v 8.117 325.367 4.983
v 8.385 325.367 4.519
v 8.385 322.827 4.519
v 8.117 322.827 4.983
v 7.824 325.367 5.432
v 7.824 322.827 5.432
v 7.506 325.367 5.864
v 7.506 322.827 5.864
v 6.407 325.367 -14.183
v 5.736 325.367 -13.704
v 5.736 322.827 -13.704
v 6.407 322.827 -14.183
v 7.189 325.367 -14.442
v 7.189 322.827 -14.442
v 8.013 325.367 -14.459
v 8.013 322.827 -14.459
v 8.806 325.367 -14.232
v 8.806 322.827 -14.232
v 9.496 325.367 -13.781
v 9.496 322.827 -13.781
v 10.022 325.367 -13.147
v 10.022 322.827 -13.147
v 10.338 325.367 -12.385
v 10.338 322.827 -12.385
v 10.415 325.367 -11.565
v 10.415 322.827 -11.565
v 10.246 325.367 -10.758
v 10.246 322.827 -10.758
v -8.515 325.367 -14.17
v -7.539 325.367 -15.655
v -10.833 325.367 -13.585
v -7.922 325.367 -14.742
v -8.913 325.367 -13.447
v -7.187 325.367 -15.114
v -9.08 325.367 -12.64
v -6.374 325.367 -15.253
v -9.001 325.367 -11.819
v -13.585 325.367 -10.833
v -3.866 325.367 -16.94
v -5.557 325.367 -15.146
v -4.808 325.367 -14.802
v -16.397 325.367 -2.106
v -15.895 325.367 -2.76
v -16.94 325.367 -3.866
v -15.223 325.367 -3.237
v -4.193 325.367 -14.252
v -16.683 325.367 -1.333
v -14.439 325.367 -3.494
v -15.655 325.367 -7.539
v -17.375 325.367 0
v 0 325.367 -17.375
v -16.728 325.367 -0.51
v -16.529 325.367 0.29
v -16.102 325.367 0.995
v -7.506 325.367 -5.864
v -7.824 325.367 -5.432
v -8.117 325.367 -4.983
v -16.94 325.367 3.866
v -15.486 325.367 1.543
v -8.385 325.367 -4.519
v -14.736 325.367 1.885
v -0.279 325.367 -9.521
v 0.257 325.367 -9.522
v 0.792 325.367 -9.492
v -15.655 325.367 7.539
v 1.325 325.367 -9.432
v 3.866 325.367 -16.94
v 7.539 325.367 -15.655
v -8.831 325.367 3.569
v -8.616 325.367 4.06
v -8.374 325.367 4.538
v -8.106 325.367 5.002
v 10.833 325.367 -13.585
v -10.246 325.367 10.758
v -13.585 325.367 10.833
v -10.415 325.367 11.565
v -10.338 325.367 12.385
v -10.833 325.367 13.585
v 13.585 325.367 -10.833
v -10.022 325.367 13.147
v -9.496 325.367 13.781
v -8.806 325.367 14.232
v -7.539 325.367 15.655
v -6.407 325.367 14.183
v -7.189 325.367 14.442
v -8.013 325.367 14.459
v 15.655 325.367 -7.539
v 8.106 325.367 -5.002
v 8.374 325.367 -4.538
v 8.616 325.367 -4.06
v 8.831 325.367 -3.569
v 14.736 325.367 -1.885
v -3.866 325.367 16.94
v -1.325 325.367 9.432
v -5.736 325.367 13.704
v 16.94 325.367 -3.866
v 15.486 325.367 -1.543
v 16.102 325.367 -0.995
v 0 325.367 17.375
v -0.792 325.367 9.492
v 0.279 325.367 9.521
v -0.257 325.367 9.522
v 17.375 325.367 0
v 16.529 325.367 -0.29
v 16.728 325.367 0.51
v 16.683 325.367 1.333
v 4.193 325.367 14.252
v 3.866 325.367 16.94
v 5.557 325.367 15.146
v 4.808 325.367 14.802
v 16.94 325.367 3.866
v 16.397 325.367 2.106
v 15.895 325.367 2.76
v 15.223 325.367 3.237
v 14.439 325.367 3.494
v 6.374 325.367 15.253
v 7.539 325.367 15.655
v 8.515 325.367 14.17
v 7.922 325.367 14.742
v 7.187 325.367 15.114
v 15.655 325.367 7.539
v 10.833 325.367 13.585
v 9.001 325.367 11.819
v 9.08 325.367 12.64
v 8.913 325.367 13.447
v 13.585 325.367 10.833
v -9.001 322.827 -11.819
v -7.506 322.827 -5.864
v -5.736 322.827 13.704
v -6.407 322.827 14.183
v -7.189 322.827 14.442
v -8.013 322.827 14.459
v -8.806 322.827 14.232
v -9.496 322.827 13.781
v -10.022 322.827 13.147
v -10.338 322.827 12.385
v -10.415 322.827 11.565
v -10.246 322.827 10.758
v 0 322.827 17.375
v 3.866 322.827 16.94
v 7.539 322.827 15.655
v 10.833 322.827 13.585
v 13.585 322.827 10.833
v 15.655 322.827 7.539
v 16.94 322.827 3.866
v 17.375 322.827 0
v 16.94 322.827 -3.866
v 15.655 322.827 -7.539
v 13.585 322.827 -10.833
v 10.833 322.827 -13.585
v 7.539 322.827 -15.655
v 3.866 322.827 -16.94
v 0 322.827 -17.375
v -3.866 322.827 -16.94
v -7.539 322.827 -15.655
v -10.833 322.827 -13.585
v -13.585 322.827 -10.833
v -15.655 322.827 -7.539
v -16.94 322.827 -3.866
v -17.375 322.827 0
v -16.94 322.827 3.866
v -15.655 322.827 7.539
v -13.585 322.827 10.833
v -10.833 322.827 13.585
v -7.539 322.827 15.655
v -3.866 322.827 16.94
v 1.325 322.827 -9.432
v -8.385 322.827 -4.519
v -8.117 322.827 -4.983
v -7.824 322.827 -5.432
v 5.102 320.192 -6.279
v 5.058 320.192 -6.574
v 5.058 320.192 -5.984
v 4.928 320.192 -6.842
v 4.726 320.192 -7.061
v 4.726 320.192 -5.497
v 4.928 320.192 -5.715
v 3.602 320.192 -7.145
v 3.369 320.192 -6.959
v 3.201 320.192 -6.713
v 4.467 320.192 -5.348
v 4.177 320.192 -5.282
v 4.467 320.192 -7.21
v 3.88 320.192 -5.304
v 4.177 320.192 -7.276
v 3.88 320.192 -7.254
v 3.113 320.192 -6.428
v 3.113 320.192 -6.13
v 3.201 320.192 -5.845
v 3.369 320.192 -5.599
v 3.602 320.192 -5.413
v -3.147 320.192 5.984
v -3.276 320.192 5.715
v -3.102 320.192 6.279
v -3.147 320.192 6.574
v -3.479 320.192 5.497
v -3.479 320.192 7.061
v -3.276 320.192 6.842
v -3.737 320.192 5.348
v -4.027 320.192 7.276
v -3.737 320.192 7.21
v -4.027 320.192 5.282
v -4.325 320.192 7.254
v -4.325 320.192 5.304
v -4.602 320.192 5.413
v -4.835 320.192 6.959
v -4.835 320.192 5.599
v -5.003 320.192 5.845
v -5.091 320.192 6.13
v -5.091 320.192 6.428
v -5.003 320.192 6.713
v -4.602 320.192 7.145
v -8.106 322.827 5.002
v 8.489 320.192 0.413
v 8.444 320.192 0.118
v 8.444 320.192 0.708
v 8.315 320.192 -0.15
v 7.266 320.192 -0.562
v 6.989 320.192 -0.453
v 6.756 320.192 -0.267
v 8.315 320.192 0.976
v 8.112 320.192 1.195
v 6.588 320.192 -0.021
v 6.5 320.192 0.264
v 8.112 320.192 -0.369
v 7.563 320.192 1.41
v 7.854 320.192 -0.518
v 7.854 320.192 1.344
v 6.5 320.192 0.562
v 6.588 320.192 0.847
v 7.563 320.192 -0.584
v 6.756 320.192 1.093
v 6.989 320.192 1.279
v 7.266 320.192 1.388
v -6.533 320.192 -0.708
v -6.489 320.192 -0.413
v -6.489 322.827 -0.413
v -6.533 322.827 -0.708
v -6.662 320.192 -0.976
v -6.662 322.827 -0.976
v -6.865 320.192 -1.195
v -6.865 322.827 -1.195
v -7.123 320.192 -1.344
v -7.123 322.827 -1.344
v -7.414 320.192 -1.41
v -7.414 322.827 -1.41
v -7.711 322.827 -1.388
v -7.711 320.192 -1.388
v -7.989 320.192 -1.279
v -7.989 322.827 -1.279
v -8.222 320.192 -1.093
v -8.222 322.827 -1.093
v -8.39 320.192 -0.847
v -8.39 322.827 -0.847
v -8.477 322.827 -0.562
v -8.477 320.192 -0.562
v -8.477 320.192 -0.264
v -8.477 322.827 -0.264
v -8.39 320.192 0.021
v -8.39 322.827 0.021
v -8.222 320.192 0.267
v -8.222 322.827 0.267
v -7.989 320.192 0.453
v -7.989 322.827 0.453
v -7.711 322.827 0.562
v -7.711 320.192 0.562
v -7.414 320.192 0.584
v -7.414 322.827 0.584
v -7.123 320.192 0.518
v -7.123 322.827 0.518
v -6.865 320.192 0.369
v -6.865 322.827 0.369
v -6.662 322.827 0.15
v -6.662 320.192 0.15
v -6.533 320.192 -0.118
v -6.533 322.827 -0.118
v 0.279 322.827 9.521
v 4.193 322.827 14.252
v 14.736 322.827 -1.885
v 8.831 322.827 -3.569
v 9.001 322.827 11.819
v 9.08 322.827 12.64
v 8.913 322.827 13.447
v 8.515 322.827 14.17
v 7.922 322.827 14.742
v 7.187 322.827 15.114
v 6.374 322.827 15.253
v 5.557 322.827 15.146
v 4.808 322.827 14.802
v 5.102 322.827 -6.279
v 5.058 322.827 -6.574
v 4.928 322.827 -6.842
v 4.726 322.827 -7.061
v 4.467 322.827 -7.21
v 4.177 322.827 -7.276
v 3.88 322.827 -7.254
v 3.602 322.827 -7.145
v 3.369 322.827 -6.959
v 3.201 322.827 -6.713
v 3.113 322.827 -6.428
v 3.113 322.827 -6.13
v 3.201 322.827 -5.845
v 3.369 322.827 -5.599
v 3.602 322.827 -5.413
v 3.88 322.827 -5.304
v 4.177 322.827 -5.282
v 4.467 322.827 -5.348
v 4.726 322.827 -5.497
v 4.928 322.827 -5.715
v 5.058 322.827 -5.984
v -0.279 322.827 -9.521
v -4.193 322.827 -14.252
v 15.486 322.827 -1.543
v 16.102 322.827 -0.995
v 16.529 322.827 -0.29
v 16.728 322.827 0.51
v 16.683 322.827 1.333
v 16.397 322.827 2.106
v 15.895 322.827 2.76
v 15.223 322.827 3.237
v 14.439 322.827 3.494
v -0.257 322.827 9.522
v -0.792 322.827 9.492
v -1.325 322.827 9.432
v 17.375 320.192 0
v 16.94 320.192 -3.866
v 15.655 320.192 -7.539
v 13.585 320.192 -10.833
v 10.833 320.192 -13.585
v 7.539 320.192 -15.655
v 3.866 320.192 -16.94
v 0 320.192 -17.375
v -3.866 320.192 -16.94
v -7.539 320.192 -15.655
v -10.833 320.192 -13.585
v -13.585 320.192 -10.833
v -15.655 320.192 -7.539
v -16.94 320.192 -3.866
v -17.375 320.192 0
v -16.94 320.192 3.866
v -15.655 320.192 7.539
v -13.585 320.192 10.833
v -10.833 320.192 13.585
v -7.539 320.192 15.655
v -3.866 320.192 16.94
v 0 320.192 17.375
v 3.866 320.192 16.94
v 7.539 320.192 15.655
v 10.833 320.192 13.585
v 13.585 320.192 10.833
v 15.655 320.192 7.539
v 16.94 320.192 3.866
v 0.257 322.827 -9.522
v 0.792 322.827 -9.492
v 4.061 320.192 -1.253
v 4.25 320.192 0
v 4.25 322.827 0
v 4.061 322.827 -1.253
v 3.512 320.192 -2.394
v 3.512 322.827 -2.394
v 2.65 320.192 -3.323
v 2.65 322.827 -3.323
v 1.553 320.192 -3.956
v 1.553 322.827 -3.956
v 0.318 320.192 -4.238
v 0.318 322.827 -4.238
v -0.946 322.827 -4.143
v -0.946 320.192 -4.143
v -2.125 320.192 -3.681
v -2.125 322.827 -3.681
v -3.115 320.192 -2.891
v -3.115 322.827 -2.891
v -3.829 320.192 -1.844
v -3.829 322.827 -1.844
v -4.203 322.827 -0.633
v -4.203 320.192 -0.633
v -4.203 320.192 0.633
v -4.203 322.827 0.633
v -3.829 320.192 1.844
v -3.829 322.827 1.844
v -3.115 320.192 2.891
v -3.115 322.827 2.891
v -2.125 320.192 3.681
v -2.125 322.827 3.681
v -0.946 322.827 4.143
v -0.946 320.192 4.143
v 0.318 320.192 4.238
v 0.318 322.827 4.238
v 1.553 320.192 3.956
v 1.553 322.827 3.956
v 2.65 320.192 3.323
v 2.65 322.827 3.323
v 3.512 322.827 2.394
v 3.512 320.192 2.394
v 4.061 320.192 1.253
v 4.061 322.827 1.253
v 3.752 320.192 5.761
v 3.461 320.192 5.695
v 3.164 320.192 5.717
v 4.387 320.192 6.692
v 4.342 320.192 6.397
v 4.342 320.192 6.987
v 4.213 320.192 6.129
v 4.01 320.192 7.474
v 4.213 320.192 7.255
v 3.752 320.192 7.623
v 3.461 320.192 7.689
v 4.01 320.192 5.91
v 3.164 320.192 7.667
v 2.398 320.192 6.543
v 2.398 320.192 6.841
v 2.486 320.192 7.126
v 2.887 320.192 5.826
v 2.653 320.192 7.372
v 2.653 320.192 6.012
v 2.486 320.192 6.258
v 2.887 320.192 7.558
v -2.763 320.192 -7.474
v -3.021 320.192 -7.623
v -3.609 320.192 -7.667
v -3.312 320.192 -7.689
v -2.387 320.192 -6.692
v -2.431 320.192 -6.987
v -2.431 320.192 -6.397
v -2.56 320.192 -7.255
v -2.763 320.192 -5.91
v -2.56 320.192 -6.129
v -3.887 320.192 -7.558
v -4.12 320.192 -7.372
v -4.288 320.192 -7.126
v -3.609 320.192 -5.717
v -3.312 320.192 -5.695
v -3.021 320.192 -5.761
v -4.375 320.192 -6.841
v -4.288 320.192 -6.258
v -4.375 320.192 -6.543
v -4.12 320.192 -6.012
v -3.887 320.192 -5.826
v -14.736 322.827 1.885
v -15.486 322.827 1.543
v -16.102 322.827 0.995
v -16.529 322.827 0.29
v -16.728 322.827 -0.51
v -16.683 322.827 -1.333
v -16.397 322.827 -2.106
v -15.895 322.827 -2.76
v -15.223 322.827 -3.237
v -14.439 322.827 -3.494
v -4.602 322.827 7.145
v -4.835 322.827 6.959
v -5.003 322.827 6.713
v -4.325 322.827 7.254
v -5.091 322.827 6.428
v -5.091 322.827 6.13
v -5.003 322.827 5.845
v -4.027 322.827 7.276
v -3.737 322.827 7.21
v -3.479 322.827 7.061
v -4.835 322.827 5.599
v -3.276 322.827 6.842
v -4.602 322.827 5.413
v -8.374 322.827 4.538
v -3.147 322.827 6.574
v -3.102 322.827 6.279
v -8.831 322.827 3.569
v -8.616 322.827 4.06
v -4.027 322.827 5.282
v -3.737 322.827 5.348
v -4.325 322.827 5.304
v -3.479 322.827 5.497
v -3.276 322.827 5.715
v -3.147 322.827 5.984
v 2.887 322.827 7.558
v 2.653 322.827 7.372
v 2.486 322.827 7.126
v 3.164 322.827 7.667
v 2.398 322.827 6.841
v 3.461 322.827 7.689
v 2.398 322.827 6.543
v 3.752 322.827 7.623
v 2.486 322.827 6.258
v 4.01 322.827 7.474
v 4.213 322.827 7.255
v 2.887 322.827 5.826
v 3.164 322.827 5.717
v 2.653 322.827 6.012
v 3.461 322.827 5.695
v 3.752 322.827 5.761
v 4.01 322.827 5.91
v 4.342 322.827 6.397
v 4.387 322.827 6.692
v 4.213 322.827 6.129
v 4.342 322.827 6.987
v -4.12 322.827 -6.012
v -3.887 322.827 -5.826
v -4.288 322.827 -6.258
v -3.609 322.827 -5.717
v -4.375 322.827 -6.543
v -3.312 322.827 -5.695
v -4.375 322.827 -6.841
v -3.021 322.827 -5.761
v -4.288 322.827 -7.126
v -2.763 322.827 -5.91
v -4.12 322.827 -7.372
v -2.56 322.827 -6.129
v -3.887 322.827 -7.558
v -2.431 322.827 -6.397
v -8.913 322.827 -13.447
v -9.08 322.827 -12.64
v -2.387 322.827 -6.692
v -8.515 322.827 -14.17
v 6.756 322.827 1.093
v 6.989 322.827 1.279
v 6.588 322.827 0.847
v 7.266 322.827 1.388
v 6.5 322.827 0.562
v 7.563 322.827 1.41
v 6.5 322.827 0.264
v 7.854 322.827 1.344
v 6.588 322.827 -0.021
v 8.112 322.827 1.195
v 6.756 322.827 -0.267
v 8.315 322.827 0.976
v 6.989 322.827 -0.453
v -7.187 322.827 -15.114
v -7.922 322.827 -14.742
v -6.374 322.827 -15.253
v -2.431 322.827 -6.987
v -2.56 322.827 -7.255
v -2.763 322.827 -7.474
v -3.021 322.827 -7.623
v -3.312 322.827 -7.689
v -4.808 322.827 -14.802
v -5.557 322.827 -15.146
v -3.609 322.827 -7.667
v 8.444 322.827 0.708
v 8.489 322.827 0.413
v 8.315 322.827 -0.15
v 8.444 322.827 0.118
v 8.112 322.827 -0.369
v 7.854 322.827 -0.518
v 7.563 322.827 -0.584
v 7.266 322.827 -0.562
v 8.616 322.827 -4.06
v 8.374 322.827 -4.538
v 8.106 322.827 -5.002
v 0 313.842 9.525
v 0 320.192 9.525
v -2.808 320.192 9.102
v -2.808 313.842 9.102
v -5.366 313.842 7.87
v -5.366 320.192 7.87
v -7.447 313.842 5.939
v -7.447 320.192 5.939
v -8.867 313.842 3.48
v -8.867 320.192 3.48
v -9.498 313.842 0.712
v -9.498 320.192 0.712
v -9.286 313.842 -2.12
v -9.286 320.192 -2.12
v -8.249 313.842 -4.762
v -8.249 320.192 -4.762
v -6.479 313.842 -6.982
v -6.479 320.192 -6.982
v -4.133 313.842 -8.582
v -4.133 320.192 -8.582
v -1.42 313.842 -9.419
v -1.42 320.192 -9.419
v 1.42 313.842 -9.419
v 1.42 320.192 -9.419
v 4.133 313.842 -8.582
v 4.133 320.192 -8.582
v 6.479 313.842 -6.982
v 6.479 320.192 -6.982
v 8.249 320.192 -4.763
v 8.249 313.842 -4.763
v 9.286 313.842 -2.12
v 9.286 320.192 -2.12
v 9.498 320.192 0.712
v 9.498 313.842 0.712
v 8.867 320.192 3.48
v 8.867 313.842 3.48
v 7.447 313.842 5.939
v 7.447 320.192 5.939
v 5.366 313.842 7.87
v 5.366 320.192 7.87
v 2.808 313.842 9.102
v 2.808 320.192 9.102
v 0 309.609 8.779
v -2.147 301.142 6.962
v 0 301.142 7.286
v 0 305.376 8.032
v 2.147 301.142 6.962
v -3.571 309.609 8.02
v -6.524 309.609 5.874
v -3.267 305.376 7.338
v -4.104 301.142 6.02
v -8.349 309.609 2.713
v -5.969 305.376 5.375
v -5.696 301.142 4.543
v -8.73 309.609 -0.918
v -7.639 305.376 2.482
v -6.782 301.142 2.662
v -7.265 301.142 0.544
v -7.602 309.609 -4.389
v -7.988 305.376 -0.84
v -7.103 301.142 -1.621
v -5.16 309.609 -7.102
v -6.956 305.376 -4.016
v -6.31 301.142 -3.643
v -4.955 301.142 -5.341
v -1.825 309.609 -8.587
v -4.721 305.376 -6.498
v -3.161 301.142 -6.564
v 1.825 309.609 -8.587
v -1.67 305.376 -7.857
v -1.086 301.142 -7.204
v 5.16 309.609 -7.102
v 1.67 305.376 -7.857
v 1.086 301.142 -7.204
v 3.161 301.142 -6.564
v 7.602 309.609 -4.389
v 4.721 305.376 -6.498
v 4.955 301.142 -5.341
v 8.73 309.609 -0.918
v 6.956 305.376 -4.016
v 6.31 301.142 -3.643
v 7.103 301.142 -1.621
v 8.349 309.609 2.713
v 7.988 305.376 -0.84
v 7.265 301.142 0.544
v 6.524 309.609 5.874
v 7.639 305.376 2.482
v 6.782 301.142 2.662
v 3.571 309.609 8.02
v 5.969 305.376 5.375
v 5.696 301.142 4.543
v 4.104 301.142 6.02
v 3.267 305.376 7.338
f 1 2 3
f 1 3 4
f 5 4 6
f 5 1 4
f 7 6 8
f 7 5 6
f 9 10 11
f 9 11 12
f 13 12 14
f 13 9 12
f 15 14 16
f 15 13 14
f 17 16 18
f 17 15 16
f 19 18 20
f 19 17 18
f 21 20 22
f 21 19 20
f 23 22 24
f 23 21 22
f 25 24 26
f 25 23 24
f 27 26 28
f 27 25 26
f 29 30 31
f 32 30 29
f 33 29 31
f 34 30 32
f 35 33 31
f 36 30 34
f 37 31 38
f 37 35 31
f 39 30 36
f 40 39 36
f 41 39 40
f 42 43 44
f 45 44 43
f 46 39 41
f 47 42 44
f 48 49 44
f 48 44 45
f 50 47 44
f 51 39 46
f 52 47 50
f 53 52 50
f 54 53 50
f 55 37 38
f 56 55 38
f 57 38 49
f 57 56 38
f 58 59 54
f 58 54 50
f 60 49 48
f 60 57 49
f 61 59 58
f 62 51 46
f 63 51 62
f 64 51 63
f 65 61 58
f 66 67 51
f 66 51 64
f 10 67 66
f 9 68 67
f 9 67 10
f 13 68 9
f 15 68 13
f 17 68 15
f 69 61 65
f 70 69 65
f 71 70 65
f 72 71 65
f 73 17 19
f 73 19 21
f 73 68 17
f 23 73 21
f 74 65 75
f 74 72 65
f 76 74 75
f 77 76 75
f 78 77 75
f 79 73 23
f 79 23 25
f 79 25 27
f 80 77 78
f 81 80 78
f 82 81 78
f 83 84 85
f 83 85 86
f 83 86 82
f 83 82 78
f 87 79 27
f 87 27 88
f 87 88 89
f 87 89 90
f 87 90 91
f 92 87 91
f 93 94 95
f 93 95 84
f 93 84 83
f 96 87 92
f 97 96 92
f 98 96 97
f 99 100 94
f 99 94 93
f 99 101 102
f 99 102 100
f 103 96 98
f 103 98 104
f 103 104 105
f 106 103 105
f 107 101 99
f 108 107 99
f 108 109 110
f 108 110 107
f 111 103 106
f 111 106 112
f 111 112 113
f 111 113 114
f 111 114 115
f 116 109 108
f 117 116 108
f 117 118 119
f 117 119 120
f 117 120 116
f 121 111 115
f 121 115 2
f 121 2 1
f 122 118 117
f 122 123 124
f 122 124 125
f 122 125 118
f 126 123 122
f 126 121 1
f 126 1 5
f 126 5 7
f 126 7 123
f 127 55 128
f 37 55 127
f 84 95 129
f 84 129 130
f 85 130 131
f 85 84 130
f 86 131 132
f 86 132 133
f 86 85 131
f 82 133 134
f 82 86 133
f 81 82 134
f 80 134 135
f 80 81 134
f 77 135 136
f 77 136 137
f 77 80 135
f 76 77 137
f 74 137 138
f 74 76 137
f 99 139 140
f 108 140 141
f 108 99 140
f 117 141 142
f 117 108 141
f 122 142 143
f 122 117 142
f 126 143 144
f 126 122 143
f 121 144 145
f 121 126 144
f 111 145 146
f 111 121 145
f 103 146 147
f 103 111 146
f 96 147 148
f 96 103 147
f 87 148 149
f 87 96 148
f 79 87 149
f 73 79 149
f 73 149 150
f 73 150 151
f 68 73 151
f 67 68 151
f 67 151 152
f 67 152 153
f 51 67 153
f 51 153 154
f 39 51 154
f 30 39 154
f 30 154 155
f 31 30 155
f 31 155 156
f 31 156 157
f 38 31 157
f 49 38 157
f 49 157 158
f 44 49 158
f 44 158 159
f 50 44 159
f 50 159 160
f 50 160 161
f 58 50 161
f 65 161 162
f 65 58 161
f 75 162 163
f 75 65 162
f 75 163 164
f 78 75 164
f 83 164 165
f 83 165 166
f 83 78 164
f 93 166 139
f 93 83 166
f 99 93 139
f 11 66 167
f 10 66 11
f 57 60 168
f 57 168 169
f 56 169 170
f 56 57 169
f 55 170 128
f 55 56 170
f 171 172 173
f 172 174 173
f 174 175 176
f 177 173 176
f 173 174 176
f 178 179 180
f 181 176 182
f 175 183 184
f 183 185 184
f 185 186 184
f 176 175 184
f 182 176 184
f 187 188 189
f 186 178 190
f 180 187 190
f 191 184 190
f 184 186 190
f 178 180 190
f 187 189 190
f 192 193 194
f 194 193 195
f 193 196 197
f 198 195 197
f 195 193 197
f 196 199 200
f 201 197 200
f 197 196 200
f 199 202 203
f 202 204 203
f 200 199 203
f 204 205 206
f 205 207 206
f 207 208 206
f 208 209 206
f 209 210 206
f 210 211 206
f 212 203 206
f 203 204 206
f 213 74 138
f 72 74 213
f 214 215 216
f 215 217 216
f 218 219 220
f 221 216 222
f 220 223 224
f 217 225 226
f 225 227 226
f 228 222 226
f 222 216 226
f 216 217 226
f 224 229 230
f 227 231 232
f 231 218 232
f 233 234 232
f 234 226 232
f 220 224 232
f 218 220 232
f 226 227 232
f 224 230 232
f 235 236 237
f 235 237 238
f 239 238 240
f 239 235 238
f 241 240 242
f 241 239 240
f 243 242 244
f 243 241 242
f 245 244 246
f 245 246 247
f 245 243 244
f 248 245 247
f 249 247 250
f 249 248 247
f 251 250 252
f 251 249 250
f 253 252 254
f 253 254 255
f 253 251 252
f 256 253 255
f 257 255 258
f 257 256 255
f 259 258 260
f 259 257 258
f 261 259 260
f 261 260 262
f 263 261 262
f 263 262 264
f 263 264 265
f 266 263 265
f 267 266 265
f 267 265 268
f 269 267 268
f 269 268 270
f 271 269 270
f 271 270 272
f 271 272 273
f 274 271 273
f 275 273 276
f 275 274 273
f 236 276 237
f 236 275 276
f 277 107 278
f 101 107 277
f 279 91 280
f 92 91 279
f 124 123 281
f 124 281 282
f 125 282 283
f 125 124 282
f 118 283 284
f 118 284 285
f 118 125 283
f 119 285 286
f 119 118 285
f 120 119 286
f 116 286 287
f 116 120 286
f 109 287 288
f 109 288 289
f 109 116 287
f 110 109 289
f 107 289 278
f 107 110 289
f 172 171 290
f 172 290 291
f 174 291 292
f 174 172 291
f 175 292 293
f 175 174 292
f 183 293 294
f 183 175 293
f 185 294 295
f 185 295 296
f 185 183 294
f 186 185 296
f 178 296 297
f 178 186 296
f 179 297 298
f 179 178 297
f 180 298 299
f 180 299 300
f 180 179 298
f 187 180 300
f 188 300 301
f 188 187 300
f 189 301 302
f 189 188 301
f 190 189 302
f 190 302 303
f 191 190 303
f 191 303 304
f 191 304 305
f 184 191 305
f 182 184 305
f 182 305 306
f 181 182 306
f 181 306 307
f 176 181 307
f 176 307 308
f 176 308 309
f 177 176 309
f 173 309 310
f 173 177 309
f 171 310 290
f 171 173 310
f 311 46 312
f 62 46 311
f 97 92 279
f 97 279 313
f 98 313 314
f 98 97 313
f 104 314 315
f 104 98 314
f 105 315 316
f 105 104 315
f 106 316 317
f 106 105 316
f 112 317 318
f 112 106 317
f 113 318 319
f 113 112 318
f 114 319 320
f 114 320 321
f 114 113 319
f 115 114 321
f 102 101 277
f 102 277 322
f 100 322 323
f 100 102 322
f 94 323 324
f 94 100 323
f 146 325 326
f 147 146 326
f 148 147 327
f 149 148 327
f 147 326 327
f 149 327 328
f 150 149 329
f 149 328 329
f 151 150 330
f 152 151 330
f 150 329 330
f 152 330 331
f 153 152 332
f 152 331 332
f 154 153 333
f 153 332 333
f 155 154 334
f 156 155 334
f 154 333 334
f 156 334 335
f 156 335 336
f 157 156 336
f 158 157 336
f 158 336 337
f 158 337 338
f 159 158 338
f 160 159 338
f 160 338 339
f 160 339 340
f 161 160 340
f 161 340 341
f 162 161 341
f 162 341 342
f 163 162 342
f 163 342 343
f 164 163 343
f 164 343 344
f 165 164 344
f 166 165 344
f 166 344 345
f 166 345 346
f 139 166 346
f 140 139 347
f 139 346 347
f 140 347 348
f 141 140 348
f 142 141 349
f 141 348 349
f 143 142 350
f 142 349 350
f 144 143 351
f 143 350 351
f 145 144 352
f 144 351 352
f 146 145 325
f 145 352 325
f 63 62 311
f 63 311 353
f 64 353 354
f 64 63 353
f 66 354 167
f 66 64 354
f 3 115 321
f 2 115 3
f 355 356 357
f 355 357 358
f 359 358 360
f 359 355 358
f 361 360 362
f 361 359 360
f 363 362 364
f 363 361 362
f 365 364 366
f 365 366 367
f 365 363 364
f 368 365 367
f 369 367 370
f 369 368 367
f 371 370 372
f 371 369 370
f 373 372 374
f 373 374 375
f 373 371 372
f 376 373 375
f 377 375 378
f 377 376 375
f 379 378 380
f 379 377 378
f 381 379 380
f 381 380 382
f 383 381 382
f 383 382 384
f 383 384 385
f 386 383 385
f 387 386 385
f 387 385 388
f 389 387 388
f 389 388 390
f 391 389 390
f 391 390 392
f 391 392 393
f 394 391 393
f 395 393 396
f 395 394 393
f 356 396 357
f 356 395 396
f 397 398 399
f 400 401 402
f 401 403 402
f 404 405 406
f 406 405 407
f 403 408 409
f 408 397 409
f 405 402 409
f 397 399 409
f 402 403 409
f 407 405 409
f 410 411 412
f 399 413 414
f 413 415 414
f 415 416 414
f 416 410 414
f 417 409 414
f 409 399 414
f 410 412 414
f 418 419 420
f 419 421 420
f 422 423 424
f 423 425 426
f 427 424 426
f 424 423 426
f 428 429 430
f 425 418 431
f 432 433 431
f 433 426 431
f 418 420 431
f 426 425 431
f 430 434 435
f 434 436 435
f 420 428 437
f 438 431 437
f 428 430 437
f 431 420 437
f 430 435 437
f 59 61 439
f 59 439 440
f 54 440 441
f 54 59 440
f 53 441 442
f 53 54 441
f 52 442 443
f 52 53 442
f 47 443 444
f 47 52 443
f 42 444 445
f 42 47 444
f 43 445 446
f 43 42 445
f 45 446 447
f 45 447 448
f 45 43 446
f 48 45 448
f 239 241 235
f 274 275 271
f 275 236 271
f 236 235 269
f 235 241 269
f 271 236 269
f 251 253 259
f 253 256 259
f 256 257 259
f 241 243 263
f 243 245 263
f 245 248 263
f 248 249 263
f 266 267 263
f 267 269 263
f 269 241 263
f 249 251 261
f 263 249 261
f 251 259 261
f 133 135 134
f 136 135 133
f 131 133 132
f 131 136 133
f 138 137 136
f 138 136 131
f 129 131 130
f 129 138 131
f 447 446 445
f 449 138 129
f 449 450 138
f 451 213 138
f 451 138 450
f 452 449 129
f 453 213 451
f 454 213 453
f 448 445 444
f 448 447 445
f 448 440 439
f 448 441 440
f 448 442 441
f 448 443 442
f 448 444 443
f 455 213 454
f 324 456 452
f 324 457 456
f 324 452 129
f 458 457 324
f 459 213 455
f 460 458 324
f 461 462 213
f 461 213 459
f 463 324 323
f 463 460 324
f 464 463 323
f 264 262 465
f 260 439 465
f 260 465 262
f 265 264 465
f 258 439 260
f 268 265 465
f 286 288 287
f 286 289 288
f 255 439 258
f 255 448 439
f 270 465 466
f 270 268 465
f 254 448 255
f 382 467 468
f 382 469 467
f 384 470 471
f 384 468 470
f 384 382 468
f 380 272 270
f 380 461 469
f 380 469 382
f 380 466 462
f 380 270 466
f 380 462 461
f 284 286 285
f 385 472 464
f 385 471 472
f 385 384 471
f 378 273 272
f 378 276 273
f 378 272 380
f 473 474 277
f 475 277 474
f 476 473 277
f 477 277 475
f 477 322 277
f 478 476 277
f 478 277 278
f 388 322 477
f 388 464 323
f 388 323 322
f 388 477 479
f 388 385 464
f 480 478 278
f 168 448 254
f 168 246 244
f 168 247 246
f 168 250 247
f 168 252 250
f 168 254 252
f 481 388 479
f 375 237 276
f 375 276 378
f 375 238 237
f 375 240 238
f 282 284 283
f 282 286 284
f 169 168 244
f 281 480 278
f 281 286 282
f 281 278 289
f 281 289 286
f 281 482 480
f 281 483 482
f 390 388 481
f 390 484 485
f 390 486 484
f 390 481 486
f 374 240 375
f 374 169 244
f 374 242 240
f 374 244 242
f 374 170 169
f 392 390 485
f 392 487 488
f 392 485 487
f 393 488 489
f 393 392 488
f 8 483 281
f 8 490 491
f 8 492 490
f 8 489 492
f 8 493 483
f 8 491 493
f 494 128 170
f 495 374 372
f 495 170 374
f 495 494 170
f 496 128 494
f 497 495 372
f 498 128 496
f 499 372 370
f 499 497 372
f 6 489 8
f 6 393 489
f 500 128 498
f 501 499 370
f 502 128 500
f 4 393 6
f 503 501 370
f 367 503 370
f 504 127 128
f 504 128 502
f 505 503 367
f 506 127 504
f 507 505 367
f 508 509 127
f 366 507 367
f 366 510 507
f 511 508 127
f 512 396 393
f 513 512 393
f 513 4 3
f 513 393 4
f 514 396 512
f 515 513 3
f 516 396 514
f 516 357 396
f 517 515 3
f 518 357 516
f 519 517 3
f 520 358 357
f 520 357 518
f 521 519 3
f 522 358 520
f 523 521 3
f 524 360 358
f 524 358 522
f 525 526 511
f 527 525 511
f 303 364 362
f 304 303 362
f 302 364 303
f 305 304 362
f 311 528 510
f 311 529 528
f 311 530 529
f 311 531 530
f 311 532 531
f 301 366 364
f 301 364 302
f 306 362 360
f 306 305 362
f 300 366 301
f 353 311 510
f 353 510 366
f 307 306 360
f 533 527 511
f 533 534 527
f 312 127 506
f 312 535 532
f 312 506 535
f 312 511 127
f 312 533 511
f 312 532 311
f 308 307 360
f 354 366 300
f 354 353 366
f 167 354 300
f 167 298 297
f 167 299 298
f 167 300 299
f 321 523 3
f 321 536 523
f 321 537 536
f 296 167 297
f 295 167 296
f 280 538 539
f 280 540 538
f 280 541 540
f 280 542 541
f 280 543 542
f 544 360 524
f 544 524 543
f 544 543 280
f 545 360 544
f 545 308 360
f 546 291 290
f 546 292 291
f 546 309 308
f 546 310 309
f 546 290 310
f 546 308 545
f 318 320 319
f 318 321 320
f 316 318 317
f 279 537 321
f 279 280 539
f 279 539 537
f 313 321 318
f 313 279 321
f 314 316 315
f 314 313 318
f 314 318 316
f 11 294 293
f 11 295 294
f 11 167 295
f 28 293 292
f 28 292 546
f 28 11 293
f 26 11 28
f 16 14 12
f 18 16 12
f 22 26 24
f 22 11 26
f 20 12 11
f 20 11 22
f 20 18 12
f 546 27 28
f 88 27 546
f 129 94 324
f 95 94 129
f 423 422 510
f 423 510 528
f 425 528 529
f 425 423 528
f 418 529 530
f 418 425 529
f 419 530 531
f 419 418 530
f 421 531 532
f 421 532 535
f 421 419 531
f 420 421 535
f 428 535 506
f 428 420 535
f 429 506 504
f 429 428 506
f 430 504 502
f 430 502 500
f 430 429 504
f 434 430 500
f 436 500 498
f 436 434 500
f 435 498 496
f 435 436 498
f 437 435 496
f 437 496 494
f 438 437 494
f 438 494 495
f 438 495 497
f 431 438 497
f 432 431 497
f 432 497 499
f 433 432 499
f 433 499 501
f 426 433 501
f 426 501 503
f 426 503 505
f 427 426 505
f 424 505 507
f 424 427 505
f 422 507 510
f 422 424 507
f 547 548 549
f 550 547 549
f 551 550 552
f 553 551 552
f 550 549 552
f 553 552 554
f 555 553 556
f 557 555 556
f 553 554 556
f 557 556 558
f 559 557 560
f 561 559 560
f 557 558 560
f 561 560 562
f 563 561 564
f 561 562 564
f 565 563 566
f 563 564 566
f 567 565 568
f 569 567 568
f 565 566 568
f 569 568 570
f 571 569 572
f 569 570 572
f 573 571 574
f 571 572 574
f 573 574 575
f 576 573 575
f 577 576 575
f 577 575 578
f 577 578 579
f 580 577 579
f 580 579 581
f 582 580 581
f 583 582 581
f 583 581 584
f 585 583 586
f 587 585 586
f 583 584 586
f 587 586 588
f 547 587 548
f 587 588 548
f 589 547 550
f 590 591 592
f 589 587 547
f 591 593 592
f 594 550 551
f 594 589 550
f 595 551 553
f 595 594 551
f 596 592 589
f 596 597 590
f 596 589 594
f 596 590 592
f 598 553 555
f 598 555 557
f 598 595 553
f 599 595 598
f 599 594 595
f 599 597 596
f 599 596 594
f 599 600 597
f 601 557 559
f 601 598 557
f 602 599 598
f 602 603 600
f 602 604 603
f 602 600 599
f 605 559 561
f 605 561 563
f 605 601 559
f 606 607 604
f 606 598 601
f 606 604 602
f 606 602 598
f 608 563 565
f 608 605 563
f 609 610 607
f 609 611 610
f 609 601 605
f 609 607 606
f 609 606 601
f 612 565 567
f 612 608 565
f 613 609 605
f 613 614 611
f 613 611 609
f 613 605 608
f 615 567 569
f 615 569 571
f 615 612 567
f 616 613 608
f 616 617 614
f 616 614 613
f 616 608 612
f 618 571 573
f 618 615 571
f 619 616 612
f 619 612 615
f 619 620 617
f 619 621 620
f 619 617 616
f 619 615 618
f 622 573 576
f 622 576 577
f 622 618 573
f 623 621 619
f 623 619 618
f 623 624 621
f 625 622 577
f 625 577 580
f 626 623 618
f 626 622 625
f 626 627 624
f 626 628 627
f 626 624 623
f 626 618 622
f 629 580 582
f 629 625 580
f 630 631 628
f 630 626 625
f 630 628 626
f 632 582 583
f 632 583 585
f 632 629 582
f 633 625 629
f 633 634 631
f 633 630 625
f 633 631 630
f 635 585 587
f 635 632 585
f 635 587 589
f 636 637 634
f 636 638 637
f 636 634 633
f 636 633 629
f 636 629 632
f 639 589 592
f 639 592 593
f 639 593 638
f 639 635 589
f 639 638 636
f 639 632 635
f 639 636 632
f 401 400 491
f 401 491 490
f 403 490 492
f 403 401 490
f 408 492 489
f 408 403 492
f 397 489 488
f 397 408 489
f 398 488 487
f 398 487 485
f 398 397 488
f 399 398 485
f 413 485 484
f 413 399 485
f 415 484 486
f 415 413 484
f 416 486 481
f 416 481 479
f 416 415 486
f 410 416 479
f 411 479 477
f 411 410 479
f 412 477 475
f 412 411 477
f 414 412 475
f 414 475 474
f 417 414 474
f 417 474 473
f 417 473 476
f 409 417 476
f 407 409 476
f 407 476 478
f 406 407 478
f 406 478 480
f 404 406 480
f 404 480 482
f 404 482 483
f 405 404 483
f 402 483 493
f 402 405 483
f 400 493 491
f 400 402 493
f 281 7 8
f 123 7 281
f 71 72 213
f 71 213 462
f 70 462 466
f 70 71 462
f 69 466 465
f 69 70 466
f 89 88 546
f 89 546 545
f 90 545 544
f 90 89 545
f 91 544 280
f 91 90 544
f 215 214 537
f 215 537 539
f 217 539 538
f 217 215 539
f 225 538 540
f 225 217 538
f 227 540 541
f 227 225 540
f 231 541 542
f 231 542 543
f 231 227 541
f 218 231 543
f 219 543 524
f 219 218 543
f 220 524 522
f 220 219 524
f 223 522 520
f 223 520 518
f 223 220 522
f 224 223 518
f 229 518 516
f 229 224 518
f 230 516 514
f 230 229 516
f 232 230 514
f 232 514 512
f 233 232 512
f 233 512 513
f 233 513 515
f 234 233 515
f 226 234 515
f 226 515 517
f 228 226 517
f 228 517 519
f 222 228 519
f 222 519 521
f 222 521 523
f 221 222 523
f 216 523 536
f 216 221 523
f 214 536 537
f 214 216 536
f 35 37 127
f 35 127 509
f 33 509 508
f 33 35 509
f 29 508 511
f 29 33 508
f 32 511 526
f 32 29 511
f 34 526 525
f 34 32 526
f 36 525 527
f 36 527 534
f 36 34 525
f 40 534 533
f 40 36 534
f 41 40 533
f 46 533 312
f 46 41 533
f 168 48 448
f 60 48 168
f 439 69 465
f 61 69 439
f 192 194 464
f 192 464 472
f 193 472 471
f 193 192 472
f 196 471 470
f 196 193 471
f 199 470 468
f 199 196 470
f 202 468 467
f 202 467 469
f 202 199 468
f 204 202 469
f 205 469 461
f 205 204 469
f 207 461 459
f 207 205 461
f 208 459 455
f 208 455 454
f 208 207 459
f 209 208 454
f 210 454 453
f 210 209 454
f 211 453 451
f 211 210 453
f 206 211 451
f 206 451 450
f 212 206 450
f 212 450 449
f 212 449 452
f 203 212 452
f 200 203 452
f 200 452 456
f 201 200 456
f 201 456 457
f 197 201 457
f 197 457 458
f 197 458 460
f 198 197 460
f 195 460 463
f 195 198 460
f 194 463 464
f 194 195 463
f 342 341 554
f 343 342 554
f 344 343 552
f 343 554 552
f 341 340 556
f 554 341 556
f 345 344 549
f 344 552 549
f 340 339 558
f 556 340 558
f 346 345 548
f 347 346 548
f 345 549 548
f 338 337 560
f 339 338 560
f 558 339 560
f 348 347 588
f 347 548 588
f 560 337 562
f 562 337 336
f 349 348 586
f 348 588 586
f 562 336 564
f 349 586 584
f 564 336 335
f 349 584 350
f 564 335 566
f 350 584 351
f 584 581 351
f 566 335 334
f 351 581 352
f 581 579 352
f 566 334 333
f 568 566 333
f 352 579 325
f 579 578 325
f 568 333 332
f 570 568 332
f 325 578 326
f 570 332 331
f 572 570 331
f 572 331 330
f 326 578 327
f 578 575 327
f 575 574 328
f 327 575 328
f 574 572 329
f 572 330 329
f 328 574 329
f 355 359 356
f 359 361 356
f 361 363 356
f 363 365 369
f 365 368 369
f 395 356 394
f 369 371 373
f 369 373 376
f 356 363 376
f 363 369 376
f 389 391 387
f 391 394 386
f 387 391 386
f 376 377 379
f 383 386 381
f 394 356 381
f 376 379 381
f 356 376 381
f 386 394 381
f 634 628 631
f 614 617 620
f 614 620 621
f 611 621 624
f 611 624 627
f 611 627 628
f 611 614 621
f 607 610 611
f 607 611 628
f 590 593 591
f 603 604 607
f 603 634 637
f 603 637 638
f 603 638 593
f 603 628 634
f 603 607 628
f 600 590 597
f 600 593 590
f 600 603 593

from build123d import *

# Parameters (mm, degrees)
SKETCH1_R                 = 17.37527472527474
BOSS_EXTRUDE1_DEPTH       = 2.54
BOSS_EXTRUDE2_START       = -5.175
BOSS_EXTRUDE2_OUTLINE_R   = 17.375274725
BOSS_EXTRUDE2_OUTLINE_R_2 = 1
BOSS_EXTRUDE2_OUTLINE_R_3 = 4.25
BOSS_EXTRUDE2_DEPTH       = 2.635
SKETCH2_R                 = 9.525
BOSS_EXTRUDE4_DEPTH       = 19.05
CHAMFER1_SIZE             = 12.7
CHAMFER1_SIZE2            = 2.23935265499751


# Read off the part's stored shape, not the designer's step: Boss-Extrude2
with BuildPart() as part:
    # Sketch1 → Boss-Extrude1 (new body)
    with BuildSketch(Plane(origin=(0, 325.36739999999986, 0), x_dir=(1, 0, 0), z_dir=(0, 1, 0))):
        with Locations(Location((0, 3.66e-14, 0), (0, 0, 270))):
            Circle(SKETCH1_R)
        with BuildLine():
            Line((-8.83112529829345, -3.568872506245661), (-14.736178288860136, -1.88495193133948))
            ThreePointArc((-14.736178288860136, -1.8849519313394787), (-16.73655161171898, 0.9233006813963234), (-14.43941301600355, 3.49447365103826))
            Line((-14.43941301600355, 3.4944736510382595), (-8.384964425073763, 4.51862773308911))
            ThreePointArc((-8.384964425073935, 4.518627733089421), (-7.974035718754682, 5.209642920203345), (-7.506296902423261, 5.863542599203262))
            Line((-7.506296902423427, 5.863542599203276), (-9.000505401882572, 11.81942878717986))
            ThreePointArc((-9.000505401882574, 11.81942878717986), (-7.5686739604387565, 14.955929208196205), (-4.1934035533472525, 14.25213531311389))
            Line((-4.193403553347251, 14.25213531311389), (-0.2792358054370207, 9.520906068487482))
            ThreePointArc((-0.27923580543699295, 9.520906068487529), (0.5246652541642909, 9.510538963227763), (1.3248283958705547, 9.432415105448642))
            Line((1.3248283958705054, 9.432415105448754), (5.7356728869774125, 13.70438071851937))
            ThreePointArc((5.7356728869774125, 13.70438071851937), (9.16787765128006, 14.03262852679995), (10.246009462656167, 10.75766166207572))
            Line((10.246009462656167, 10.75766166207572), (8.1057286196369, 5.0022783353981914))
            ThreePointArc((8.105728619637244, 5.002278335398186), (8.498700972919012, 4.300896043024725), (8.831125298293639, 3.5688725062459628))
            Line((8.831125298293461, 3.5688725062457136), (14.736178288860124, 1.884951931339582))
            ThreePointArc((14.736178288860126, 1.8849519313395824), (16.736551611718987, -0.9233006813962088), (14.43941301600357, -3.494473651038158))
            Line((14.43941301600357, -3.4944736510381578), (8.384964425073758, -4.518627733089059))
            ThreePointArc((8.384964425073925, -4.518627733089367), (7.974035718754691, -5.20964292020326), (7.506296902423297, -5.863542599203144))
            Line((7.5062969024234505, -5.863542599203156), (9.000505401882656, -11.8194287871798))
            ThreePointArc((9.000505401882656, -11.8194287871798), (7.568673960438859, -14.955929208196153), (4.193403553347351, -14.252135313113861))
            Line((4.193403553347352, -14.252135313113861), (0.2792358054370711, -9.520906068487413))
            ThreePointArc((0.2792358054370489, -9.520906068487452), (-0.5246652541641907, -9.510538963227694), (-1.3248283958704137, -9.432415105448587))
            Line((-1.3248283958703642, -9.432415105448698), (-5.735672886977412, -13.70438071851937))
            ThreePointArc((-5.7356728869774125, -13.70438071851937), (-9.167877651280058, -14.032628526799948), (-10.246009462656165, -10.75766166207572))
            Line((-10.246009462656165, -10.75766166207572), (-8.105728619636901, -5.002278335398116))
            ThreePointArc((-8.105728619637246, -5.002278335398109), (-8.498700972919007, -4.300896043024661), (-8.83112529829363, -3.56887250624591))
        make_face(mode=Mode.SUBTRACT)
    extrude(amount=-BOSS_EXTRUDE1_DEPTH)

    # Boss-Extrude2 outline → Boss-Extrude2 (add)
    with BuildSketch(Plane(origin=(0, 325.36739999999986, 0), x_dir=(1, 0, 0), z_dir=(0, 1, 0)).offset(BOSS_EXTRUDE2_START)):
        Circle(BOSS_EXTRUDE2_OUTLINE_R)
        with Locations((-4.10208104, -6.278768282)):
            Circle(BOSS_EXTRUDE2_OUTLINE_R_2, mode=Mode.SUBTRACT)
        with Locations((3.386532317, -6.69189053)):
            Circle(BOSS_EXTRUDE2_OUTLINE_R_2, mode=Mode.SUBTRACT)
        with Locations((7.488613357, -0.413122247)):
            Circle(BOSS_EXTRUDE2_OUTLINE_R_2, mode=Mode.SUBTRACT)
        with Locations((-7.488613357, 0.413122247)):
            Circle(BOSS_EXTRUDE2_OUTLINE_R_2, mode=Mode.SUBTRACT)
        with Locations((-3.386532317, 6.69189053)):
            Circle(BOSS_EXTRUDE2_OUTLINE_R_2, mode=Mode.SUBTRACT)
        Circle(BOSS_EXTRUDE2_OUTLINE_R_3, mode=Mode.SUBTRACT)
        with Locations((4.10208104, 6.278768282)):
            Circle(BOSS_EXTRUDE2_OUTLINE_R_2, mode=Mode.SUBTRACT)
    extrude(amount=BOSS_EXTRUDE2_DEPTH)

    # Sketch2 → Boss-Extrude4 (add)
    with BuildSketch(Plane.XZ.offset(-320.19239999999985)):
        with Locations(Location((0, 0, 0), (0, 0, 90))):
            Circle(SKETCH2_R)
    extrude(amount=BOSS_EXTRUDE4_DEPTH)

    # Chamfer1
    chamfer1_edges = [part.edges().sort_by_distance(p)[0] for p in [
        (-1.75e-15, 301.14239999999984, -9.525),
    ]]
    chamfer1_side = [part.faces().sort_by_distance(p)[0] for p in [
        (-1.75e-15, 310.6673999999999, -9.525),
    ]]
    chamfer(chamfer1_edges, length=CHAMFER1_SIZE, length2=CHAMFER1_SIZE2, reference=chamfer1_side[0])


solid = part.part
